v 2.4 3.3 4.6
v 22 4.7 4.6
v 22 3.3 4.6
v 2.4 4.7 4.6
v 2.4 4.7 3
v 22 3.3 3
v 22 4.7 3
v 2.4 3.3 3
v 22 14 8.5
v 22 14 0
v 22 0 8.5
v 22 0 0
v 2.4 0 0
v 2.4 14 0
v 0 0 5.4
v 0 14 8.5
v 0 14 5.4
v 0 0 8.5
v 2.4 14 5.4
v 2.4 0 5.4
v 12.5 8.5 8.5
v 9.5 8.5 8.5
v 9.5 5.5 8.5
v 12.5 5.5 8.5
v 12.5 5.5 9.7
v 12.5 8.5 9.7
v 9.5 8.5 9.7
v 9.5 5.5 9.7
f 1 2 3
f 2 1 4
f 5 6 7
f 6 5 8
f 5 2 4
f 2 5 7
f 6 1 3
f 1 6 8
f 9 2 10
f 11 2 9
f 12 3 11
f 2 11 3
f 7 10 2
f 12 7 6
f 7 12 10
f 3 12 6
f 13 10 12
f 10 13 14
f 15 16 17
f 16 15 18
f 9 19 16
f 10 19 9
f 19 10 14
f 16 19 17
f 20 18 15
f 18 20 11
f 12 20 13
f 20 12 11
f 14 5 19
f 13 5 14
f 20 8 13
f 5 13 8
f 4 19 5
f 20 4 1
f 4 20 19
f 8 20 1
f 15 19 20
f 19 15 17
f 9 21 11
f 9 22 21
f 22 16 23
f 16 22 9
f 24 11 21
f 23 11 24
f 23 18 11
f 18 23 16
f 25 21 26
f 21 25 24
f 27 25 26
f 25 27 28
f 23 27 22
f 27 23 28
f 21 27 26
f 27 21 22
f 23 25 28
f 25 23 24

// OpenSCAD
// 仓库 (battle_warehouse) — 大空间厂房 近战掩体
// 真实大卷帘门洞(可开车/进入) + 侧面高窗洞(穿窗射击) + 平屋顶
$fn = 4;

module warehouse() {
  w = 22; d = 14; h = 8;

  color([0.66, 0.64, 0.60])
    difference() {
      cube([w, d, h]);
      // 大卷帘门洞（前 +y，贯穿，可进入）
      translate([-2.4, -0.3, 0]) cube([4.8, d + 0.6, 5.4]);
      // 侧高窗洞（贯穿两侧）
      for (yy = [-4.0, 4.0])
        translate([-0.3, yy - 0.7, 3.0]) cube([w + 0.6, 1.4, 1.6]);
    }

  // 平屋顶 + 女儿墙
  color([0.55, 0.53, 0.50]) translate([0, 0, h]) cube([w, d, 0.5]);
  // 屋顶通风口（掩体）
  color([0.50, 0.48, 0.46]) translate([w/2 - 1.5, d/2 - 1.5, h + 0.5]) cube([3, 3, 1.2]);
}

warehouse();
